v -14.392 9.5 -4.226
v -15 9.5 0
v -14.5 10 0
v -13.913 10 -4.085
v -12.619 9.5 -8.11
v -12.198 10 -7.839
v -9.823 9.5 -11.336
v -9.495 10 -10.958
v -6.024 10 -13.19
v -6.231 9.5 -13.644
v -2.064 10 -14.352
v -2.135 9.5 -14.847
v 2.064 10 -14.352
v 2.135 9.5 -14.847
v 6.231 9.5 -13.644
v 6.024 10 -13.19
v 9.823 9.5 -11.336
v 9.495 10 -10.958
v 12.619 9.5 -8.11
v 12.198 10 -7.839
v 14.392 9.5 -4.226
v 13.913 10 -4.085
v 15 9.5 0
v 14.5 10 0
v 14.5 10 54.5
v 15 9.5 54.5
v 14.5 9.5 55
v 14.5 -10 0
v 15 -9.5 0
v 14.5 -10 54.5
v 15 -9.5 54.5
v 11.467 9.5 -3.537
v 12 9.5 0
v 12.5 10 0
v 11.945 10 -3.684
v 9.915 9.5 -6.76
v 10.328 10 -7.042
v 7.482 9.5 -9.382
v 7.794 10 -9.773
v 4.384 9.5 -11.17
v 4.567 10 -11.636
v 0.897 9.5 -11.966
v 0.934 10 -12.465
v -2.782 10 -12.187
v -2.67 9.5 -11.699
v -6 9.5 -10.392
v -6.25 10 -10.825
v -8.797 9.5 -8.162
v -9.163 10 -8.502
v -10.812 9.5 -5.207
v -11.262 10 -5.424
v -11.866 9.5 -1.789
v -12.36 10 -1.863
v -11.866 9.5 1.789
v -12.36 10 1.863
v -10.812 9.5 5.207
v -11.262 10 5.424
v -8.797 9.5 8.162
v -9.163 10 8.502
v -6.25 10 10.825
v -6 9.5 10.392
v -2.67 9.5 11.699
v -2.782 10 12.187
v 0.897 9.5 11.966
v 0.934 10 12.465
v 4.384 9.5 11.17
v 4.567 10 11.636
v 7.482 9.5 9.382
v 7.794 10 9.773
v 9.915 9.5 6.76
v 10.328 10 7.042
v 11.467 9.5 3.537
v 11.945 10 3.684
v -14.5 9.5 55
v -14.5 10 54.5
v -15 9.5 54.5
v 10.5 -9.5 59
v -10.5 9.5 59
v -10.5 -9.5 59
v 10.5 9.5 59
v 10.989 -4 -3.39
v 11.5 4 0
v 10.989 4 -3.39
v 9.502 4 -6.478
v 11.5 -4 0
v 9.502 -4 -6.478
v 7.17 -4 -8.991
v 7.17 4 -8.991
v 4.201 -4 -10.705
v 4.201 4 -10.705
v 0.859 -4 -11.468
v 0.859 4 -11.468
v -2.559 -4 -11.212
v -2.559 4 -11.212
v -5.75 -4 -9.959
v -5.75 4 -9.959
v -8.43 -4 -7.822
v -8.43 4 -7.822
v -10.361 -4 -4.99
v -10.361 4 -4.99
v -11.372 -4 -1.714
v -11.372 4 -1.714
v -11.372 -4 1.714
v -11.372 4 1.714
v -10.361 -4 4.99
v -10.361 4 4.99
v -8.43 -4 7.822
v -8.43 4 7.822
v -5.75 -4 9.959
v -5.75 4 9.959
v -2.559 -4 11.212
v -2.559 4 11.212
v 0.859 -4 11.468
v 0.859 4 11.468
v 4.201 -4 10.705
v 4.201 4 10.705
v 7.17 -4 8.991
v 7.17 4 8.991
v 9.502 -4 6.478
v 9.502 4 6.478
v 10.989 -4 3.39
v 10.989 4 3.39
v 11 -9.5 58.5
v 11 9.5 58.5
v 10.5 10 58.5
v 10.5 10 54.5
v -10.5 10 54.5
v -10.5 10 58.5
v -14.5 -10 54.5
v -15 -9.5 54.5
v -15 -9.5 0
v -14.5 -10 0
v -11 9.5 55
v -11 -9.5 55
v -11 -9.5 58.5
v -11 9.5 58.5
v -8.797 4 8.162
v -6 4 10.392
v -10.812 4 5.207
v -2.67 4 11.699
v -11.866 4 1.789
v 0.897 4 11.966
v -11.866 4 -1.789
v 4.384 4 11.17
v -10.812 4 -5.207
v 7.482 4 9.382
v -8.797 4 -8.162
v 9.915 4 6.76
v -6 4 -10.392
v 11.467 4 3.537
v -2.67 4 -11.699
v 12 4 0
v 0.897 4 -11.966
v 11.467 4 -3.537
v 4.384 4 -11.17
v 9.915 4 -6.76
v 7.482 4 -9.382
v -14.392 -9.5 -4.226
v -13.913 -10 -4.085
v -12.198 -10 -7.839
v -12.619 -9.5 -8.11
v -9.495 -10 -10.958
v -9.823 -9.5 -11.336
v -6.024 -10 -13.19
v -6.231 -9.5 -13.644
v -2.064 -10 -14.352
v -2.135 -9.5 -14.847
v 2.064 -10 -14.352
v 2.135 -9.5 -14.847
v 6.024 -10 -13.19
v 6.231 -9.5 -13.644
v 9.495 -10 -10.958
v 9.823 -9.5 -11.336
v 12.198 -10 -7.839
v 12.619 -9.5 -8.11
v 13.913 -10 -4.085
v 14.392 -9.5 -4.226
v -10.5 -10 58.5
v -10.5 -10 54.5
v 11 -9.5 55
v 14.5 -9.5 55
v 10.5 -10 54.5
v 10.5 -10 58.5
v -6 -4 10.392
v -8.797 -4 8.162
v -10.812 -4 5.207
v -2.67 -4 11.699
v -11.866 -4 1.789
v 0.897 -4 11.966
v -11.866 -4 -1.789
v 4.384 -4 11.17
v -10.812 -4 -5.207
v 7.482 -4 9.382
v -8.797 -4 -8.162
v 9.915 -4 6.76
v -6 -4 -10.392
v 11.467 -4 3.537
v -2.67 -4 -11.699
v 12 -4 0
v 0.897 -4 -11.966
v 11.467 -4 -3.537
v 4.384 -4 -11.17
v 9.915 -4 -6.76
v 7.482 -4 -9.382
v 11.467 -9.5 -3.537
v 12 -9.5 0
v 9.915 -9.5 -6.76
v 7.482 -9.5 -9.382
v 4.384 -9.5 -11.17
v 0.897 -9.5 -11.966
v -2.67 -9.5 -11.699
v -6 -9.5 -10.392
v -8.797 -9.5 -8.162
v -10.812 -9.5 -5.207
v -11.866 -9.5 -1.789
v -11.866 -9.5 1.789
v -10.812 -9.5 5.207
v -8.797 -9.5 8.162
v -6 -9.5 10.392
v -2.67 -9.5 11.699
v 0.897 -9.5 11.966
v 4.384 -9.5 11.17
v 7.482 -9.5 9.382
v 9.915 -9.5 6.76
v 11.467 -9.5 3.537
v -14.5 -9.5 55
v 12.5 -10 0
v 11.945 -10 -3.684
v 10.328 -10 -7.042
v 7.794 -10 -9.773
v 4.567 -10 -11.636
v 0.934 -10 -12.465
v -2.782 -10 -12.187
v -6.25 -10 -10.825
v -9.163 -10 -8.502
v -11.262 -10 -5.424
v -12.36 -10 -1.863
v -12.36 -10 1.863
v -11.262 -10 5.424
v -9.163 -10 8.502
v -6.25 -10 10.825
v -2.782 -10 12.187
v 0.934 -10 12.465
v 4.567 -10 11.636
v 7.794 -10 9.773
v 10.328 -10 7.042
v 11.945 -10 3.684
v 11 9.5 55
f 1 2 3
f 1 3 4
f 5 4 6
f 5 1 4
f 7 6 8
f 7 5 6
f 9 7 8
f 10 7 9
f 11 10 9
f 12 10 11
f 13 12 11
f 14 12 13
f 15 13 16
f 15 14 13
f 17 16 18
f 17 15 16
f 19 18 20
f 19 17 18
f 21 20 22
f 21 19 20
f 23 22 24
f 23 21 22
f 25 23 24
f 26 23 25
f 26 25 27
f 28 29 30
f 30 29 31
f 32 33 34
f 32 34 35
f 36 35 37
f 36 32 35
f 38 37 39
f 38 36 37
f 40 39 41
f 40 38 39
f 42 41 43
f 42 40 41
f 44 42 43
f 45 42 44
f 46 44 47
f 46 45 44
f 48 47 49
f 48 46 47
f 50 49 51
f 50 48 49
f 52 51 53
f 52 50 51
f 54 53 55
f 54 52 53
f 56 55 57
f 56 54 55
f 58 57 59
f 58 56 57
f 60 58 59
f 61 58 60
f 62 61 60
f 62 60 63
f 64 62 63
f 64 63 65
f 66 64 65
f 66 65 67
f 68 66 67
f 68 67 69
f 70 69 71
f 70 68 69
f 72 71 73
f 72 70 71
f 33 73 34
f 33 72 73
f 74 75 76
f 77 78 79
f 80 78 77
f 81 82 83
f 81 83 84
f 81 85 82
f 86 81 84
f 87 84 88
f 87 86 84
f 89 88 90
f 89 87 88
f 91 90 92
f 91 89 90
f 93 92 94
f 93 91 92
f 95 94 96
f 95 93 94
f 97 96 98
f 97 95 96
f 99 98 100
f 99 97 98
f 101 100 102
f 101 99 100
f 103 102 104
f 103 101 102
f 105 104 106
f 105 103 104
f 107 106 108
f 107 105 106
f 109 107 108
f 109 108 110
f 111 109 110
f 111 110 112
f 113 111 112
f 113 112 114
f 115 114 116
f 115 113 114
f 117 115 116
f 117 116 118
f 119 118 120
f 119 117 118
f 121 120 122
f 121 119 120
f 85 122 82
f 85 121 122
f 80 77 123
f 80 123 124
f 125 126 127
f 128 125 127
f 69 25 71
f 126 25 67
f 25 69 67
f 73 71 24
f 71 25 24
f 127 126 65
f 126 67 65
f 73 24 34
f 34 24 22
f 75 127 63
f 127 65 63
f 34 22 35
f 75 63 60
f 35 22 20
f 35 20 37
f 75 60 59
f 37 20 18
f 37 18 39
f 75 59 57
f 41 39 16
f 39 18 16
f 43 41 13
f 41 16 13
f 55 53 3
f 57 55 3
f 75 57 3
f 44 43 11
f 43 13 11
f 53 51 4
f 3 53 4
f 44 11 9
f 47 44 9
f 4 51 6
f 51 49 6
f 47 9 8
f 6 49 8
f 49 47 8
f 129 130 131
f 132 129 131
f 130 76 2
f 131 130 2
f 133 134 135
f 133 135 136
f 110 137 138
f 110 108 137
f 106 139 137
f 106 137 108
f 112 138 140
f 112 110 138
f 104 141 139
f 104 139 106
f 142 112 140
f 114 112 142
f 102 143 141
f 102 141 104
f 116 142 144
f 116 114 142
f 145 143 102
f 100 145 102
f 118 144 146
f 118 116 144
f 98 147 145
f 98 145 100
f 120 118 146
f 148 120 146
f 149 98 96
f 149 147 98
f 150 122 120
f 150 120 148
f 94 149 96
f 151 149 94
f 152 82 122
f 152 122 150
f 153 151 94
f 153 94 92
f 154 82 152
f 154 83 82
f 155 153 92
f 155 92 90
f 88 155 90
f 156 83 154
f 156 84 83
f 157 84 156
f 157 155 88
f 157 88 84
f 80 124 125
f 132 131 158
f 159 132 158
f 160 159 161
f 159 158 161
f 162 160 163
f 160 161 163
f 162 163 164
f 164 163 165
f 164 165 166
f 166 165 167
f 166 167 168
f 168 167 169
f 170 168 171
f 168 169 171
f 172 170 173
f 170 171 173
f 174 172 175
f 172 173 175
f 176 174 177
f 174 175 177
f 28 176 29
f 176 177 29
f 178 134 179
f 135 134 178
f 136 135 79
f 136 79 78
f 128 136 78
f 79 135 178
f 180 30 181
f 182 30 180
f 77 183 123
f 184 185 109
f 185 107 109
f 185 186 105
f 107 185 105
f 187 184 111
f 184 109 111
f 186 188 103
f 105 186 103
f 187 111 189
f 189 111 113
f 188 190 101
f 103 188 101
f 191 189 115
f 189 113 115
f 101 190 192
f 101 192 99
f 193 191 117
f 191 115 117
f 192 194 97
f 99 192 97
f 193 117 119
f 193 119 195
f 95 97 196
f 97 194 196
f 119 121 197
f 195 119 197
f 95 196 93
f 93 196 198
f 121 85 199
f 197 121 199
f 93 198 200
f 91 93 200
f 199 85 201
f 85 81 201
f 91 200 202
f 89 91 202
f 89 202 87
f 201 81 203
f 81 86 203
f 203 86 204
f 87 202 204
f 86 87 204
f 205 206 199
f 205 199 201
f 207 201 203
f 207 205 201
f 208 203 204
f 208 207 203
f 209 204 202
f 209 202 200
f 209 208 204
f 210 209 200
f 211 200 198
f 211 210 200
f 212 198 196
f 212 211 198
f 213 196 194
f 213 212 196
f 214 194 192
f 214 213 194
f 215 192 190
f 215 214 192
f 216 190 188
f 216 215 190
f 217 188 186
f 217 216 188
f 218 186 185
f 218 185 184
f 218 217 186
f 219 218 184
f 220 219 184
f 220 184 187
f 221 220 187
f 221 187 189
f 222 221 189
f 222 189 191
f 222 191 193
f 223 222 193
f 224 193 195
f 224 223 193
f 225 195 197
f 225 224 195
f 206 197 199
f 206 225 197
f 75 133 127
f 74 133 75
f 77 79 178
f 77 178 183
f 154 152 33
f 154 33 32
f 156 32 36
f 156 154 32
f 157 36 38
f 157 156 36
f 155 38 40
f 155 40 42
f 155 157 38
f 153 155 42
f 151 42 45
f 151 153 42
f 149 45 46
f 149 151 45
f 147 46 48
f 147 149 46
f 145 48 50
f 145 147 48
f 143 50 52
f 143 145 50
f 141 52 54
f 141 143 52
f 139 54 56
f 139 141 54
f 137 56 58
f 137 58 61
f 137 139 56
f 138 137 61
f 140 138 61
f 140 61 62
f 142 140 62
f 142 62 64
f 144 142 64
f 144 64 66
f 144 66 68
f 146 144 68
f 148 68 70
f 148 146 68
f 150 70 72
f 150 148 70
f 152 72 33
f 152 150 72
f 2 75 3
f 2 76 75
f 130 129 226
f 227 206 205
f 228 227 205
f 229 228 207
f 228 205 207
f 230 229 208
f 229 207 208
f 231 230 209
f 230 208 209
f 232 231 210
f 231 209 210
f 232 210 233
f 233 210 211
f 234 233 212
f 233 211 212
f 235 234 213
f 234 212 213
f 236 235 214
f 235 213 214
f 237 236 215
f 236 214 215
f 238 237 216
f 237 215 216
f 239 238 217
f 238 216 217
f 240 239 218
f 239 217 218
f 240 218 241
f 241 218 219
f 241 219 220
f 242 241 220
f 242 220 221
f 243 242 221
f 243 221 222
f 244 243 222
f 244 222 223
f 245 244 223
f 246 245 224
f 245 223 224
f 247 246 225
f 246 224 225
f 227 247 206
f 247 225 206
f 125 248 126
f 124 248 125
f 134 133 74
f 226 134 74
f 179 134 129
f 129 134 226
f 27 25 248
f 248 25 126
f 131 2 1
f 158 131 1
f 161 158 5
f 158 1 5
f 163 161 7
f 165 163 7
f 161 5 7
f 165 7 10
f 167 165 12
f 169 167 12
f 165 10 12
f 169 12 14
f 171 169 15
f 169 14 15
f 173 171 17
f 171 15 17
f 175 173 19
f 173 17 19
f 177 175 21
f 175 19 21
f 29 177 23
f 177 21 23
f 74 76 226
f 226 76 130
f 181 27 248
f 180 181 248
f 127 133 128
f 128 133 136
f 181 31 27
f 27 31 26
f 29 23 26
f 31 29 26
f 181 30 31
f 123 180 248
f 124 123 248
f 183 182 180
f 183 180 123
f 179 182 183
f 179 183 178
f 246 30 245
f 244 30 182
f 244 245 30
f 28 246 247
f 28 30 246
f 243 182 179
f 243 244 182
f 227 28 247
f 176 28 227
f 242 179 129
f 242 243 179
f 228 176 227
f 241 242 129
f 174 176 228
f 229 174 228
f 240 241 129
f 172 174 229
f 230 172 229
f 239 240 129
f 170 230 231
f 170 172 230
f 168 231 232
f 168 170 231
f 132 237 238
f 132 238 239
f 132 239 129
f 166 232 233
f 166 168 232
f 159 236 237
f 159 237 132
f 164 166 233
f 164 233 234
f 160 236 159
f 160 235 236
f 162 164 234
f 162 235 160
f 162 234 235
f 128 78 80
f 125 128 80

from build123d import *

# Parameters (mm, degrees)
SKETCH1_R           = 12
BOSS_EXTRUDE1_DEPTH = 10
SKETCH2_R           = 12
SKETCH2_R_2         = 11.5
BOSS_EXTRUDE2_DEPTH = 4
SKETCH3_W           = 22
SKETCH3_H           = 20
BOSS_EXTRUDE3_DEPTH = 4
CHAMFER2_SIZE       = 0.5


with BuildPart() as part:
    # Sketch1 → Boss-Extrude1 (new body, symmetric)
    with BuildSketch(Plane(origin=(0, 0, 0), x_dir=(1, 0, 0), z_dir=(0, 1, 0))):
        with BuildLine():
            Line((15, -55), (-15, -55))
            Line((-15, -55), (-15, 0))
            ThreePointArc((-15, 0), (0, 15), (15, 0))
            Line((15, 0), (15, -55))
        make_face()
        Circle(SKETCH1_R, mode=Mode.SUBTRACT)
    extrude(amount=BOSS_EXTRUDE1_DEPTH, both=True)

    # Sketch2 → Boss-Extrude2 (add, symmetric)
    with BuildSketch(Plane(origin=(0, 0, 0), x_dir=(1, 0, 0), z_dir=(0, 1, 0))):
        Circle(SKETCH2_R)
        Circle(SKETCH2_R_2, mode=Mode.SUBTRACT)
    extrude(amount=BOSS_EXTRUDE2_DEPTH, both=True)

    # Sketch3 → Boss-Extrude3 (add)
    with BuildSketch(Plane.XY.offset(55)):
        Rectangle(SKETCH3_W, SKETCH3_H)
    extrude(amount=BOSS_EXTRUDE3_DEPTH)

    # Chamfer2
    chamfer2_edges = [part.edges().sort_by_distance(p)[0] for p in [
        (-15, 10, 27.5),
        (-12, -10, 0),
        (-12, 10, 0),
        (-13, 10, 55),
        (13, -10, 55),
        (13, 10, 55),
        (-11, 10, 57),
        (-11, -10, 57),
        (11, -10, 57),
        (11, 10, 57),
        (-11, 0, 59),
        (0, -10, 59),
        (11, 0, 59),
        (0, 10, 59),
        (15, 10, 27.5),
        (-13, -10, 55),
        (-15, -10, 27.5),
        (0, -10, -15),
        (15, -10, 27.5),
        (0, 10, -15),
        (15, 0, 55),
        (-15, 0, 55),
    ]]
    chamfer(chamfer2_edges, length=CHAMFER2_SIZE)


solid = part.part
